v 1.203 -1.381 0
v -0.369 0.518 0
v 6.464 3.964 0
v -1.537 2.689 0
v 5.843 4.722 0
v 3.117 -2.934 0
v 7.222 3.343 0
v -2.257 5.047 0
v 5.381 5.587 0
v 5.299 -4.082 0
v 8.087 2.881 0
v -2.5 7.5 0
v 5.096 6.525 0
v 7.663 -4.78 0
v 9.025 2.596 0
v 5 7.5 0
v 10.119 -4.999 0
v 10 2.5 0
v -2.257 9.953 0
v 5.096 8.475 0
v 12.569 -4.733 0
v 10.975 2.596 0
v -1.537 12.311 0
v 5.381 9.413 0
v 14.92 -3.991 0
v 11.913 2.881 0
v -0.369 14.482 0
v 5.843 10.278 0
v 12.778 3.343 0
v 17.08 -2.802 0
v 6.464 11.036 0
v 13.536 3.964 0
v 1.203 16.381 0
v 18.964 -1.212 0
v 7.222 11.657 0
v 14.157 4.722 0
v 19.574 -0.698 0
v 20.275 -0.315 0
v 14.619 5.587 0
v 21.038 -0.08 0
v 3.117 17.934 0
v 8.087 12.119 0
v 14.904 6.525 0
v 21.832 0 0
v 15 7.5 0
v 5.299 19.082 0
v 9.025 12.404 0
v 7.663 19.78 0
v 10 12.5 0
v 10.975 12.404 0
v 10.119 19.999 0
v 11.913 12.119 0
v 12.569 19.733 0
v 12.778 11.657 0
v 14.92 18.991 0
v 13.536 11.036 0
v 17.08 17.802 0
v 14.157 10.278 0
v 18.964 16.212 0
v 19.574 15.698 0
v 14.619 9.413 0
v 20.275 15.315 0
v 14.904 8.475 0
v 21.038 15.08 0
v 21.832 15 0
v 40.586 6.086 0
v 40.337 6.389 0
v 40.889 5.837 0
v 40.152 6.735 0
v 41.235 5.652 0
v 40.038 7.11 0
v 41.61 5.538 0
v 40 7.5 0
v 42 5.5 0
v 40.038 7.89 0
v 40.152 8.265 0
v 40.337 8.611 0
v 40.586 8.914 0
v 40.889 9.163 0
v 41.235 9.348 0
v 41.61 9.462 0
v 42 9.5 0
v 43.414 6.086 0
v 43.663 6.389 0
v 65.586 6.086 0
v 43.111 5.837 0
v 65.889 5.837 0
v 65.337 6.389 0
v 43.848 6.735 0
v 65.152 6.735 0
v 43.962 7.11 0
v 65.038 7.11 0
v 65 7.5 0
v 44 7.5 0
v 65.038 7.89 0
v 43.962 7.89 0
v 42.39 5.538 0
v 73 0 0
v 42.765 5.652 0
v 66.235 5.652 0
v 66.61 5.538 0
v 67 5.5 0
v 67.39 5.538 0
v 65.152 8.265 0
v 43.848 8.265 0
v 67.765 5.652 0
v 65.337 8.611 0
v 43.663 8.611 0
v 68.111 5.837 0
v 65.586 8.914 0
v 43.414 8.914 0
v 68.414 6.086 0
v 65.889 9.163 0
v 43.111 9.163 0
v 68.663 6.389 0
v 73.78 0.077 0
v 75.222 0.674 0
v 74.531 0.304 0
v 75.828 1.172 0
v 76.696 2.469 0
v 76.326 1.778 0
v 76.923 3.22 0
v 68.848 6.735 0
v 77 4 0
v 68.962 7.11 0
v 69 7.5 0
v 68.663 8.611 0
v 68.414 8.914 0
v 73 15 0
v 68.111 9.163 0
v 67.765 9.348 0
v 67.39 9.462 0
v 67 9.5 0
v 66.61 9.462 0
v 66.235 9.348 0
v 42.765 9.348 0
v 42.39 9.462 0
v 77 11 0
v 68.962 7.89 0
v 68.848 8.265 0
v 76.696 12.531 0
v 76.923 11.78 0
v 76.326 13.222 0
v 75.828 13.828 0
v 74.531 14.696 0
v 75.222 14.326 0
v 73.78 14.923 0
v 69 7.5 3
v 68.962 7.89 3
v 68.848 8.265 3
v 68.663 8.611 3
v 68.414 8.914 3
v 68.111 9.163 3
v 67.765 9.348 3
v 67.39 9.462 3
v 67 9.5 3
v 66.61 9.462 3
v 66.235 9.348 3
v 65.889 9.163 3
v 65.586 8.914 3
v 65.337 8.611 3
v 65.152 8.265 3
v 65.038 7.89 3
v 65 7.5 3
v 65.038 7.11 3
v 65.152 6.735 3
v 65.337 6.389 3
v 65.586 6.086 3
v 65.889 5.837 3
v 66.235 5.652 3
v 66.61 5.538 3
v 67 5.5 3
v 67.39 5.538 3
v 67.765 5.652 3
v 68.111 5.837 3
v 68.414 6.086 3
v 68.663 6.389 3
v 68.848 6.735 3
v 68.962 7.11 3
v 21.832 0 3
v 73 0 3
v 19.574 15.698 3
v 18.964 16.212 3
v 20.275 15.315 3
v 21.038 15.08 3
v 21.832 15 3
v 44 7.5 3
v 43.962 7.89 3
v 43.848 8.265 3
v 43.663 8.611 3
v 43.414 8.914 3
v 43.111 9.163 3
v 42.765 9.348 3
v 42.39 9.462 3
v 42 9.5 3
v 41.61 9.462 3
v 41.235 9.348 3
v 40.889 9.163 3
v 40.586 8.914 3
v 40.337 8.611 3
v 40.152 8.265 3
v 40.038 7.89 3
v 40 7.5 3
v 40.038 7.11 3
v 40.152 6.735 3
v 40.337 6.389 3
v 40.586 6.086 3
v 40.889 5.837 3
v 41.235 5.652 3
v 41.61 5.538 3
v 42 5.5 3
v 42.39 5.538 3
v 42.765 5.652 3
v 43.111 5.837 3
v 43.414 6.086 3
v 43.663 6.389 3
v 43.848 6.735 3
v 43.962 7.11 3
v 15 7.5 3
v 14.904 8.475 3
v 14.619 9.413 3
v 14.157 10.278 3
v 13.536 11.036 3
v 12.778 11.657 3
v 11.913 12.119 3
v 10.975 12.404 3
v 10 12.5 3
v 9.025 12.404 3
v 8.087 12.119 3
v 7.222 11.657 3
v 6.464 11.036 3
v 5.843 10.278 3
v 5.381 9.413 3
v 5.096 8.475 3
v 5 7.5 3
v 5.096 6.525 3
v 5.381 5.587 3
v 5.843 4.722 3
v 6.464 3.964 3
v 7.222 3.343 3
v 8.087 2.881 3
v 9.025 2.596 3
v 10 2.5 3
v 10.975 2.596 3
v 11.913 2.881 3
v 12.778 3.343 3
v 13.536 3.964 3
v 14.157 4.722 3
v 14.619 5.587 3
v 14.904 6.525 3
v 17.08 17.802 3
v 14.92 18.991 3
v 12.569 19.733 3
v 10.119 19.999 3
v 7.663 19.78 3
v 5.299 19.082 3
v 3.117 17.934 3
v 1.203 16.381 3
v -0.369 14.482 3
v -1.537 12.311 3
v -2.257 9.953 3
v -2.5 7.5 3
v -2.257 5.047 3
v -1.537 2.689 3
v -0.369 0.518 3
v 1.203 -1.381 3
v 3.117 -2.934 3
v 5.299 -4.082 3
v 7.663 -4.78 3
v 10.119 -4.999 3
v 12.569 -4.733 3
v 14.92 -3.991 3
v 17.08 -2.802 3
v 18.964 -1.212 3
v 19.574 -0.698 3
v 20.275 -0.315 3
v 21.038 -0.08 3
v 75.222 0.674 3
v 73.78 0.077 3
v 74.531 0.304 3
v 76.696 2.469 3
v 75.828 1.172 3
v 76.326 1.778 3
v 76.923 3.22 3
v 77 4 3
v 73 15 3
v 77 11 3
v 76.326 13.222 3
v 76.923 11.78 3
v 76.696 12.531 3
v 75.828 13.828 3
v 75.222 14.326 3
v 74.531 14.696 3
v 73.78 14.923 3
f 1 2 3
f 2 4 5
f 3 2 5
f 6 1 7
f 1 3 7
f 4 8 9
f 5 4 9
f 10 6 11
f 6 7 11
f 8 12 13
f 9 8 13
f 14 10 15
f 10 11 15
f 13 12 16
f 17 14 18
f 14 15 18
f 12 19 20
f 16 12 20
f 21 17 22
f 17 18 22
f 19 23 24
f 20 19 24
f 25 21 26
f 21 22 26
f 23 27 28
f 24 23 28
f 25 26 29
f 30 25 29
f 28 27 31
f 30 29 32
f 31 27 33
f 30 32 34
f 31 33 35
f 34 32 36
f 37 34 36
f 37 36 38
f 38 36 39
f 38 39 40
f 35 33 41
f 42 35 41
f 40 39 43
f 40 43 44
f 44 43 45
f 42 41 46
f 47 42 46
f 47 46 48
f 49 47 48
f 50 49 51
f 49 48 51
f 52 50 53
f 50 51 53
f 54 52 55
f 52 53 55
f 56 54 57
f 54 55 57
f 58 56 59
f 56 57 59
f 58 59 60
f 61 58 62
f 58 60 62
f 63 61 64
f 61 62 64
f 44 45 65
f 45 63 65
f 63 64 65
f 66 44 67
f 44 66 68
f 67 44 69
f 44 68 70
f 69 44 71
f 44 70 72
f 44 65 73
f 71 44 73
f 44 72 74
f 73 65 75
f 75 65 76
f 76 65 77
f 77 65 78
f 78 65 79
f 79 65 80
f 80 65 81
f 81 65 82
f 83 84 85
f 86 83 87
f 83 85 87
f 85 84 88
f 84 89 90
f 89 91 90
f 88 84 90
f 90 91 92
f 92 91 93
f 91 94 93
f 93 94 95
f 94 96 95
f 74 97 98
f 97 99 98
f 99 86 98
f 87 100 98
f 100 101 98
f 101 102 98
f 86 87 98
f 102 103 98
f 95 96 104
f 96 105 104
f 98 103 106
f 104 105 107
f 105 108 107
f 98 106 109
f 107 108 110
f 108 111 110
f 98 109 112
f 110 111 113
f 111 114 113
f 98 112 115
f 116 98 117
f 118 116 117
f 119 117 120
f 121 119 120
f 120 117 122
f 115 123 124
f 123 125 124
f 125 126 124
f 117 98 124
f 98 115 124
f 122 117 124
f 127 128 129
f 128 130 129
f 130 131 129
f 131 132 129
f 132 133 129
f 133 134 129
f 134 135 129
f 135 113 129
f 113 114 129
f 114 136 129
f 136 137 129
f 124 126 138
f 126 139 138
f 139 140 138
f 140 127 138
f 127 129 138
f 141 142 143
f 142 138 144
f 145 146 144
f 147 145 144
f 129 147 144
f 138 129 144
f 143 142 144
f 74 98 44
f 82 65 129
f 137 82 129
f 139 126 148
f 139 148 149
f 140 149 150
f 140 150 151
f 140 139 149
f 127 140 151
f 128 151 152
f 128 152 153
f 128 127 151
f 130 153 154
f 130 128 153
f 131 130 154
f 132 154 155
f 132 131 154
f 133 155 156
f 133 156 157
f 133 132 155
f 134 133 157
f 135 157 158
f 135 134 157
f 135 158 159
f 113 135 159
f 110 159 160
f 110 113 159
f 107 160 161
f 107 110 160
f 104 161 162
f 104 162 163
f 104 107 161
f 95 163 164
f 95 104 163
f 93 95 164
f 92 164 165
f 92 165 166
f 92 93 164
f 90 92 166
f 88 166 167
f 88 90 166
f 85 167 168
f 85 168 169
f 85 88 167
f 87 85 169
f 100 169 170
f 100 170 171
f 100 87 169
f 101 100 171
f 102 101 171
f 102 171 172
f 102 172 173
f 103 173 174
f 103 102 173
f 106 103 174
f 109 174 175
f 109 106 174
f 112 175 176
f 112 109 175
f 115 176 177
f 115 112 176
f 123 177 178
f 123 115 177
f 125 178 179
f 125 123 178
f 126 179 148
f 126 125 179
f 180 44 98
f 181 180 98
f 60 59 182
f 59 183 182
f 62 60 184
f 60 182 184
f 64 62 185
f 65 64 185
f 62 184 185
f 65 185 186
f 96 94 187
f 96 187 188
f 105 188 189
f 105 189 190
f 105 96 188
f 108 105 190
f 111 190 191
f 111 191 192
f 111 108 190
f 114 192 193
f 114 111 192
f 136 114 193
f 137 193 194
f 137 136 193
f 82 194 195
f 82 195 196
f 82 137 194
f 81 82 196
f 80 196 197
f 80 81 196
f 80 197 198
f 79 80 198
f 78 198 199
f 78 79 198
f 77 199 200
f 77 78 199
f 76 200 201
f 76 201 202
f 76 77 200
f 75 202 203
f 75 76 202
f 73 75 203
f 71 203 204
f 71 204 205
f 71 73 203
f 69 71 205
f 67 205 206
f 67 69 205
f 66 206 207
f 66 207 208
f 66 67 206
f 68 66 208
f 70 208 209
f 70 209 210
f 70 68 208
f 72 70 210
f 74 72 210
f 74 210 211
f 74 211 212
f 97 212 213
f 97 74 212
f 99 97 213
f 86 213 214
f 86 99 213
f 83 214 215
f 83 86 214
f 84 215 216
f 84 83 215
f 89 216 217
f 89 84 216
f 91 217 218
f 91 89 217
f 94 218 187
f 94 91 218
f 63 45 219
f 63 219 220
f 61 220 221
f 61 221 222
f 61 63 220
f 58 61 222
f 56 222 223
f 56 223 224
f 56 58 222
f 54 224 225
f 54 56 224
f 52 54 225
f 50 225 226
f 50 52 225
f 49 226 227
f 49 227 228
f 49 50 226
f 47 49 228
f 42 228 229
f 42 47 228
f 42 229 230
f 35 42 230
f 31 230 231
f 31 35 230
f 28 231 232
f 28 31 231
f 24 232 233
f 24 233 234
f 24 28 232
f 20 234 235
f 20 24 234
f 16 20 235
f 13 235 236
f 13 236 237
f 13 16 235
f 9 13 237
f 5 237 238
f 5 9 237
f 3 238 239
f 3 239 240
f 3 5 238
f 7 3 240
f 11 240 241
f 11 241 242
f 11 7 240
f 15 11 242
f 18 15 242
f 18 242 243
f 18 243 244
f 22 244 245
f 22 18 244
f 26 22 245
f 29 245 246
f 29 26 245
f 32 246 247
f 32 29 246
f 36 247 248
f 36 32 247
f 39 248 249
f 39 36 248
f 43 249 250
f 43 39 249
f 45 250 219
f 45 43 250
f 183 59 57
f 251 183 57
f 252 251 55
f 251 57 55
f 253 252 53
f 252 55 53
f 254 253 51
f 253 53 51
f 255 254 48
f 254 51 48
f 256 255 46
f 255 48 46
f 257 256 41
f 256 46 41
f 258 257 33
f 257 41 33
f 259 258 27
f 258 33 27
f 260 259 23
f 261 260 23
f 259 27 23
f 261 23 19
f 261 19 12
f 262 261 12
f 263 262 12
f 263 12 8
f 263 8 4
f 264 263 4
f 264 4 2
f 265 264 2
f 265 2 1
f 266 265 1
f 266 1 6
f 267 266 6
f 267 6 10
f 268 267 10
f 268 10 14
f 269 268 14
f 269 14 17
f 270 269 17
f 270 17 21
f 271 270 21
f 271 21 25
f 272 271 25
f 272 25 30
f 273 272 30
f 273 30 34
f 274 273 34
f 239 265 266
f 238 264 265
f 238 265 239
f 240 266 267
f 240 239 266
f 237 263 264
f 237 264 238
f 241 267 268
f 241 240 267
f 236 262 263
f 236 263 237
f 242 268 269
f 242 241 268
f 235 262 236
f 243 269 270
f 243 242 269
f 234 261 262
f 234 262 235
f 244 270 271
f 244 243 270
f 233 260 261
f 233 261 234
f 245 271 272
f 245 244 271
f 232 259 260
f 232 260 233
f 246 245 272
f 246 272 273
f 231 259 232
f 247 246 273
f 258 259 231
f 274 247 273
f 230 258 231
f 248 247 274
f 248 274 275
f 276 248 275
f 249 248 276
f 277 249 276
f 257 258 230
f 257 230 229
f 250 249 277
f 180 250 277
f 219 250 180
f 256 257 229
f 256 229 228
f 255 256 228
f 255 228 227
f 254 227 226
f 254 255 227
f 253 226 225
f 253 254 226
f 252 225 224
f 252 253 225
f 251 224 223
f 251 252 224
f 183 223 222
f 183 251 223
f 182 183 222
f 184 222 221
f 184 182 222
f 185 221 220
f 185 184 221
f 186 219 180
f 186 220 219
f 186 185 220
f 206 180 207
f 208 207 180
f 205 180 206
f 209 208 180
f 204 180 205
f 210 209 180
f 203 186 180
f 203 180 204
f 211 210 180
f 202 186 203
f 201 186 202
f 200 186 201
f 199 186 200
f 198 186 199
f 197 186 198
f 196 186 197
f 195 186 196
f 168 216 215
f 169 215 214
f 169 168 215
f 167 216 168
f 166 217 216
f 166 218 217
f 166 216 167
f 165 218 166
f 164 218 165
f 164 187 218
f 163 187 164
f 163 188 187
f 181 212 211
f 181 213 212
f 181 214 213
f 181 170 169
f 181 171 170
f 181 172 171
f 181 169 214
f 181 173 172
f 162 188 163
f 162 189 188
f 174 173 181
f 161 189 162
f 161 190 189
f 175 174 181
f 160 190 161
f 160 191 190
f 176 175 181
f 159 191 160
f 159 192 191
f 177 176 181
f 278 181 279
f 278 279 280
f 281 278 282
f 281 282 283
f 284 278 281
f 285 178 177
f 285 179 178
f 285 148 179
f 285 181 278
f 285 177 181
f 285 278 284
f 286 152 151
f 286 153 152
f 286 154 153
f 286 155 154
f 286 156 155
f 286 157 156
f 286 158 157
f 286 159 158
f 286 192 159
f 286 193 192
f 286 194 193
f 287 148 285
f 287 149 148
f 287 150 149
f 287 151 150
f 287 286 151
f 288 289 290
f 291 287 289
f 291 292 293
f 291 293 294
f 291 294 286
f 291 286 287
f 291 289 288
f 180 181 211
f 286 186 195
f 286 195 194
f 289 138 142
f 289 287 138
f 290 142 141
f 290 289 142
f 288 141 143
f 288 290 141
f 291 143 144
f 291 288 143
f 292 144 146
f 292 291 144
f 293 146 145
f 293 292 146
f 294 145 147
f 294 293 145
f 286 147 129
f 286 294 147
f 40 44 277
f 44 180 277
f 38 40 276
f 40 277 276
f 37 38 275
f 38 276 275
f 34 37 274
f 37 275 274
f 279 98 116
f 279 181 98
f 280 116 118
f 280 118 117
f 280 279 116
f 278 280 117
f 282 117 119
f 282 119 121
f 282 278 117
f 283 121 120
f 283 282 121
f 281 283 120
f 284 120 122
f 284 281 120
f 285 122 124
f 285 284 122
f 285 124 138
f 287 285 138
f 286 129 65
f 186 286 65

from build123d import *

# Parameters (mm, degrees)
SKETCH1_R           = 5
SKETCH1_R_2         = 2
BOSS_EXTRUDE1_DEPTH = 3
FILLET2_R           = 4


with BuildPart() as part:
    # Sketch1 → Boss-Extrude1 (new body)
    with BuildSketch(Plane.XY):
        with BuildLine():
            Line((20, 0), (77, 0))
            Line((77, 0), (77, 15))
            Line((77, 15), (20, 15))
            ThreePointArc((20, 15), (-2.5, 7.5), (20, 0))
        make_face()
        with Locations((10, 7.5)):
            Circle(SKETCH1_R, mode=Mode.SUBTRACT)
        with Locations((67, 7.5)):
            Circle(SKETCH1_R_2, mode=Mode.SUBTRACT)
        with Locations((42, 7.5)):
            Circle(SKETCH1_R_2, mode=Mode.SUBTRACT)
    extrude(amount=BOSS_EXTRUDE1_DEPTH)

    # Fillet2
    fillet2_edges = [part.edges().sort_by_distance(p)[0] for p in [
        (20, 15, 1.5),
        (77, 15, 1.5),
        (77, 0, 1.5),
        (20, 0, 1.5),
    ]]
    fillet(fillet2_edges, radius=FILLET2_R)


solid = part.part
